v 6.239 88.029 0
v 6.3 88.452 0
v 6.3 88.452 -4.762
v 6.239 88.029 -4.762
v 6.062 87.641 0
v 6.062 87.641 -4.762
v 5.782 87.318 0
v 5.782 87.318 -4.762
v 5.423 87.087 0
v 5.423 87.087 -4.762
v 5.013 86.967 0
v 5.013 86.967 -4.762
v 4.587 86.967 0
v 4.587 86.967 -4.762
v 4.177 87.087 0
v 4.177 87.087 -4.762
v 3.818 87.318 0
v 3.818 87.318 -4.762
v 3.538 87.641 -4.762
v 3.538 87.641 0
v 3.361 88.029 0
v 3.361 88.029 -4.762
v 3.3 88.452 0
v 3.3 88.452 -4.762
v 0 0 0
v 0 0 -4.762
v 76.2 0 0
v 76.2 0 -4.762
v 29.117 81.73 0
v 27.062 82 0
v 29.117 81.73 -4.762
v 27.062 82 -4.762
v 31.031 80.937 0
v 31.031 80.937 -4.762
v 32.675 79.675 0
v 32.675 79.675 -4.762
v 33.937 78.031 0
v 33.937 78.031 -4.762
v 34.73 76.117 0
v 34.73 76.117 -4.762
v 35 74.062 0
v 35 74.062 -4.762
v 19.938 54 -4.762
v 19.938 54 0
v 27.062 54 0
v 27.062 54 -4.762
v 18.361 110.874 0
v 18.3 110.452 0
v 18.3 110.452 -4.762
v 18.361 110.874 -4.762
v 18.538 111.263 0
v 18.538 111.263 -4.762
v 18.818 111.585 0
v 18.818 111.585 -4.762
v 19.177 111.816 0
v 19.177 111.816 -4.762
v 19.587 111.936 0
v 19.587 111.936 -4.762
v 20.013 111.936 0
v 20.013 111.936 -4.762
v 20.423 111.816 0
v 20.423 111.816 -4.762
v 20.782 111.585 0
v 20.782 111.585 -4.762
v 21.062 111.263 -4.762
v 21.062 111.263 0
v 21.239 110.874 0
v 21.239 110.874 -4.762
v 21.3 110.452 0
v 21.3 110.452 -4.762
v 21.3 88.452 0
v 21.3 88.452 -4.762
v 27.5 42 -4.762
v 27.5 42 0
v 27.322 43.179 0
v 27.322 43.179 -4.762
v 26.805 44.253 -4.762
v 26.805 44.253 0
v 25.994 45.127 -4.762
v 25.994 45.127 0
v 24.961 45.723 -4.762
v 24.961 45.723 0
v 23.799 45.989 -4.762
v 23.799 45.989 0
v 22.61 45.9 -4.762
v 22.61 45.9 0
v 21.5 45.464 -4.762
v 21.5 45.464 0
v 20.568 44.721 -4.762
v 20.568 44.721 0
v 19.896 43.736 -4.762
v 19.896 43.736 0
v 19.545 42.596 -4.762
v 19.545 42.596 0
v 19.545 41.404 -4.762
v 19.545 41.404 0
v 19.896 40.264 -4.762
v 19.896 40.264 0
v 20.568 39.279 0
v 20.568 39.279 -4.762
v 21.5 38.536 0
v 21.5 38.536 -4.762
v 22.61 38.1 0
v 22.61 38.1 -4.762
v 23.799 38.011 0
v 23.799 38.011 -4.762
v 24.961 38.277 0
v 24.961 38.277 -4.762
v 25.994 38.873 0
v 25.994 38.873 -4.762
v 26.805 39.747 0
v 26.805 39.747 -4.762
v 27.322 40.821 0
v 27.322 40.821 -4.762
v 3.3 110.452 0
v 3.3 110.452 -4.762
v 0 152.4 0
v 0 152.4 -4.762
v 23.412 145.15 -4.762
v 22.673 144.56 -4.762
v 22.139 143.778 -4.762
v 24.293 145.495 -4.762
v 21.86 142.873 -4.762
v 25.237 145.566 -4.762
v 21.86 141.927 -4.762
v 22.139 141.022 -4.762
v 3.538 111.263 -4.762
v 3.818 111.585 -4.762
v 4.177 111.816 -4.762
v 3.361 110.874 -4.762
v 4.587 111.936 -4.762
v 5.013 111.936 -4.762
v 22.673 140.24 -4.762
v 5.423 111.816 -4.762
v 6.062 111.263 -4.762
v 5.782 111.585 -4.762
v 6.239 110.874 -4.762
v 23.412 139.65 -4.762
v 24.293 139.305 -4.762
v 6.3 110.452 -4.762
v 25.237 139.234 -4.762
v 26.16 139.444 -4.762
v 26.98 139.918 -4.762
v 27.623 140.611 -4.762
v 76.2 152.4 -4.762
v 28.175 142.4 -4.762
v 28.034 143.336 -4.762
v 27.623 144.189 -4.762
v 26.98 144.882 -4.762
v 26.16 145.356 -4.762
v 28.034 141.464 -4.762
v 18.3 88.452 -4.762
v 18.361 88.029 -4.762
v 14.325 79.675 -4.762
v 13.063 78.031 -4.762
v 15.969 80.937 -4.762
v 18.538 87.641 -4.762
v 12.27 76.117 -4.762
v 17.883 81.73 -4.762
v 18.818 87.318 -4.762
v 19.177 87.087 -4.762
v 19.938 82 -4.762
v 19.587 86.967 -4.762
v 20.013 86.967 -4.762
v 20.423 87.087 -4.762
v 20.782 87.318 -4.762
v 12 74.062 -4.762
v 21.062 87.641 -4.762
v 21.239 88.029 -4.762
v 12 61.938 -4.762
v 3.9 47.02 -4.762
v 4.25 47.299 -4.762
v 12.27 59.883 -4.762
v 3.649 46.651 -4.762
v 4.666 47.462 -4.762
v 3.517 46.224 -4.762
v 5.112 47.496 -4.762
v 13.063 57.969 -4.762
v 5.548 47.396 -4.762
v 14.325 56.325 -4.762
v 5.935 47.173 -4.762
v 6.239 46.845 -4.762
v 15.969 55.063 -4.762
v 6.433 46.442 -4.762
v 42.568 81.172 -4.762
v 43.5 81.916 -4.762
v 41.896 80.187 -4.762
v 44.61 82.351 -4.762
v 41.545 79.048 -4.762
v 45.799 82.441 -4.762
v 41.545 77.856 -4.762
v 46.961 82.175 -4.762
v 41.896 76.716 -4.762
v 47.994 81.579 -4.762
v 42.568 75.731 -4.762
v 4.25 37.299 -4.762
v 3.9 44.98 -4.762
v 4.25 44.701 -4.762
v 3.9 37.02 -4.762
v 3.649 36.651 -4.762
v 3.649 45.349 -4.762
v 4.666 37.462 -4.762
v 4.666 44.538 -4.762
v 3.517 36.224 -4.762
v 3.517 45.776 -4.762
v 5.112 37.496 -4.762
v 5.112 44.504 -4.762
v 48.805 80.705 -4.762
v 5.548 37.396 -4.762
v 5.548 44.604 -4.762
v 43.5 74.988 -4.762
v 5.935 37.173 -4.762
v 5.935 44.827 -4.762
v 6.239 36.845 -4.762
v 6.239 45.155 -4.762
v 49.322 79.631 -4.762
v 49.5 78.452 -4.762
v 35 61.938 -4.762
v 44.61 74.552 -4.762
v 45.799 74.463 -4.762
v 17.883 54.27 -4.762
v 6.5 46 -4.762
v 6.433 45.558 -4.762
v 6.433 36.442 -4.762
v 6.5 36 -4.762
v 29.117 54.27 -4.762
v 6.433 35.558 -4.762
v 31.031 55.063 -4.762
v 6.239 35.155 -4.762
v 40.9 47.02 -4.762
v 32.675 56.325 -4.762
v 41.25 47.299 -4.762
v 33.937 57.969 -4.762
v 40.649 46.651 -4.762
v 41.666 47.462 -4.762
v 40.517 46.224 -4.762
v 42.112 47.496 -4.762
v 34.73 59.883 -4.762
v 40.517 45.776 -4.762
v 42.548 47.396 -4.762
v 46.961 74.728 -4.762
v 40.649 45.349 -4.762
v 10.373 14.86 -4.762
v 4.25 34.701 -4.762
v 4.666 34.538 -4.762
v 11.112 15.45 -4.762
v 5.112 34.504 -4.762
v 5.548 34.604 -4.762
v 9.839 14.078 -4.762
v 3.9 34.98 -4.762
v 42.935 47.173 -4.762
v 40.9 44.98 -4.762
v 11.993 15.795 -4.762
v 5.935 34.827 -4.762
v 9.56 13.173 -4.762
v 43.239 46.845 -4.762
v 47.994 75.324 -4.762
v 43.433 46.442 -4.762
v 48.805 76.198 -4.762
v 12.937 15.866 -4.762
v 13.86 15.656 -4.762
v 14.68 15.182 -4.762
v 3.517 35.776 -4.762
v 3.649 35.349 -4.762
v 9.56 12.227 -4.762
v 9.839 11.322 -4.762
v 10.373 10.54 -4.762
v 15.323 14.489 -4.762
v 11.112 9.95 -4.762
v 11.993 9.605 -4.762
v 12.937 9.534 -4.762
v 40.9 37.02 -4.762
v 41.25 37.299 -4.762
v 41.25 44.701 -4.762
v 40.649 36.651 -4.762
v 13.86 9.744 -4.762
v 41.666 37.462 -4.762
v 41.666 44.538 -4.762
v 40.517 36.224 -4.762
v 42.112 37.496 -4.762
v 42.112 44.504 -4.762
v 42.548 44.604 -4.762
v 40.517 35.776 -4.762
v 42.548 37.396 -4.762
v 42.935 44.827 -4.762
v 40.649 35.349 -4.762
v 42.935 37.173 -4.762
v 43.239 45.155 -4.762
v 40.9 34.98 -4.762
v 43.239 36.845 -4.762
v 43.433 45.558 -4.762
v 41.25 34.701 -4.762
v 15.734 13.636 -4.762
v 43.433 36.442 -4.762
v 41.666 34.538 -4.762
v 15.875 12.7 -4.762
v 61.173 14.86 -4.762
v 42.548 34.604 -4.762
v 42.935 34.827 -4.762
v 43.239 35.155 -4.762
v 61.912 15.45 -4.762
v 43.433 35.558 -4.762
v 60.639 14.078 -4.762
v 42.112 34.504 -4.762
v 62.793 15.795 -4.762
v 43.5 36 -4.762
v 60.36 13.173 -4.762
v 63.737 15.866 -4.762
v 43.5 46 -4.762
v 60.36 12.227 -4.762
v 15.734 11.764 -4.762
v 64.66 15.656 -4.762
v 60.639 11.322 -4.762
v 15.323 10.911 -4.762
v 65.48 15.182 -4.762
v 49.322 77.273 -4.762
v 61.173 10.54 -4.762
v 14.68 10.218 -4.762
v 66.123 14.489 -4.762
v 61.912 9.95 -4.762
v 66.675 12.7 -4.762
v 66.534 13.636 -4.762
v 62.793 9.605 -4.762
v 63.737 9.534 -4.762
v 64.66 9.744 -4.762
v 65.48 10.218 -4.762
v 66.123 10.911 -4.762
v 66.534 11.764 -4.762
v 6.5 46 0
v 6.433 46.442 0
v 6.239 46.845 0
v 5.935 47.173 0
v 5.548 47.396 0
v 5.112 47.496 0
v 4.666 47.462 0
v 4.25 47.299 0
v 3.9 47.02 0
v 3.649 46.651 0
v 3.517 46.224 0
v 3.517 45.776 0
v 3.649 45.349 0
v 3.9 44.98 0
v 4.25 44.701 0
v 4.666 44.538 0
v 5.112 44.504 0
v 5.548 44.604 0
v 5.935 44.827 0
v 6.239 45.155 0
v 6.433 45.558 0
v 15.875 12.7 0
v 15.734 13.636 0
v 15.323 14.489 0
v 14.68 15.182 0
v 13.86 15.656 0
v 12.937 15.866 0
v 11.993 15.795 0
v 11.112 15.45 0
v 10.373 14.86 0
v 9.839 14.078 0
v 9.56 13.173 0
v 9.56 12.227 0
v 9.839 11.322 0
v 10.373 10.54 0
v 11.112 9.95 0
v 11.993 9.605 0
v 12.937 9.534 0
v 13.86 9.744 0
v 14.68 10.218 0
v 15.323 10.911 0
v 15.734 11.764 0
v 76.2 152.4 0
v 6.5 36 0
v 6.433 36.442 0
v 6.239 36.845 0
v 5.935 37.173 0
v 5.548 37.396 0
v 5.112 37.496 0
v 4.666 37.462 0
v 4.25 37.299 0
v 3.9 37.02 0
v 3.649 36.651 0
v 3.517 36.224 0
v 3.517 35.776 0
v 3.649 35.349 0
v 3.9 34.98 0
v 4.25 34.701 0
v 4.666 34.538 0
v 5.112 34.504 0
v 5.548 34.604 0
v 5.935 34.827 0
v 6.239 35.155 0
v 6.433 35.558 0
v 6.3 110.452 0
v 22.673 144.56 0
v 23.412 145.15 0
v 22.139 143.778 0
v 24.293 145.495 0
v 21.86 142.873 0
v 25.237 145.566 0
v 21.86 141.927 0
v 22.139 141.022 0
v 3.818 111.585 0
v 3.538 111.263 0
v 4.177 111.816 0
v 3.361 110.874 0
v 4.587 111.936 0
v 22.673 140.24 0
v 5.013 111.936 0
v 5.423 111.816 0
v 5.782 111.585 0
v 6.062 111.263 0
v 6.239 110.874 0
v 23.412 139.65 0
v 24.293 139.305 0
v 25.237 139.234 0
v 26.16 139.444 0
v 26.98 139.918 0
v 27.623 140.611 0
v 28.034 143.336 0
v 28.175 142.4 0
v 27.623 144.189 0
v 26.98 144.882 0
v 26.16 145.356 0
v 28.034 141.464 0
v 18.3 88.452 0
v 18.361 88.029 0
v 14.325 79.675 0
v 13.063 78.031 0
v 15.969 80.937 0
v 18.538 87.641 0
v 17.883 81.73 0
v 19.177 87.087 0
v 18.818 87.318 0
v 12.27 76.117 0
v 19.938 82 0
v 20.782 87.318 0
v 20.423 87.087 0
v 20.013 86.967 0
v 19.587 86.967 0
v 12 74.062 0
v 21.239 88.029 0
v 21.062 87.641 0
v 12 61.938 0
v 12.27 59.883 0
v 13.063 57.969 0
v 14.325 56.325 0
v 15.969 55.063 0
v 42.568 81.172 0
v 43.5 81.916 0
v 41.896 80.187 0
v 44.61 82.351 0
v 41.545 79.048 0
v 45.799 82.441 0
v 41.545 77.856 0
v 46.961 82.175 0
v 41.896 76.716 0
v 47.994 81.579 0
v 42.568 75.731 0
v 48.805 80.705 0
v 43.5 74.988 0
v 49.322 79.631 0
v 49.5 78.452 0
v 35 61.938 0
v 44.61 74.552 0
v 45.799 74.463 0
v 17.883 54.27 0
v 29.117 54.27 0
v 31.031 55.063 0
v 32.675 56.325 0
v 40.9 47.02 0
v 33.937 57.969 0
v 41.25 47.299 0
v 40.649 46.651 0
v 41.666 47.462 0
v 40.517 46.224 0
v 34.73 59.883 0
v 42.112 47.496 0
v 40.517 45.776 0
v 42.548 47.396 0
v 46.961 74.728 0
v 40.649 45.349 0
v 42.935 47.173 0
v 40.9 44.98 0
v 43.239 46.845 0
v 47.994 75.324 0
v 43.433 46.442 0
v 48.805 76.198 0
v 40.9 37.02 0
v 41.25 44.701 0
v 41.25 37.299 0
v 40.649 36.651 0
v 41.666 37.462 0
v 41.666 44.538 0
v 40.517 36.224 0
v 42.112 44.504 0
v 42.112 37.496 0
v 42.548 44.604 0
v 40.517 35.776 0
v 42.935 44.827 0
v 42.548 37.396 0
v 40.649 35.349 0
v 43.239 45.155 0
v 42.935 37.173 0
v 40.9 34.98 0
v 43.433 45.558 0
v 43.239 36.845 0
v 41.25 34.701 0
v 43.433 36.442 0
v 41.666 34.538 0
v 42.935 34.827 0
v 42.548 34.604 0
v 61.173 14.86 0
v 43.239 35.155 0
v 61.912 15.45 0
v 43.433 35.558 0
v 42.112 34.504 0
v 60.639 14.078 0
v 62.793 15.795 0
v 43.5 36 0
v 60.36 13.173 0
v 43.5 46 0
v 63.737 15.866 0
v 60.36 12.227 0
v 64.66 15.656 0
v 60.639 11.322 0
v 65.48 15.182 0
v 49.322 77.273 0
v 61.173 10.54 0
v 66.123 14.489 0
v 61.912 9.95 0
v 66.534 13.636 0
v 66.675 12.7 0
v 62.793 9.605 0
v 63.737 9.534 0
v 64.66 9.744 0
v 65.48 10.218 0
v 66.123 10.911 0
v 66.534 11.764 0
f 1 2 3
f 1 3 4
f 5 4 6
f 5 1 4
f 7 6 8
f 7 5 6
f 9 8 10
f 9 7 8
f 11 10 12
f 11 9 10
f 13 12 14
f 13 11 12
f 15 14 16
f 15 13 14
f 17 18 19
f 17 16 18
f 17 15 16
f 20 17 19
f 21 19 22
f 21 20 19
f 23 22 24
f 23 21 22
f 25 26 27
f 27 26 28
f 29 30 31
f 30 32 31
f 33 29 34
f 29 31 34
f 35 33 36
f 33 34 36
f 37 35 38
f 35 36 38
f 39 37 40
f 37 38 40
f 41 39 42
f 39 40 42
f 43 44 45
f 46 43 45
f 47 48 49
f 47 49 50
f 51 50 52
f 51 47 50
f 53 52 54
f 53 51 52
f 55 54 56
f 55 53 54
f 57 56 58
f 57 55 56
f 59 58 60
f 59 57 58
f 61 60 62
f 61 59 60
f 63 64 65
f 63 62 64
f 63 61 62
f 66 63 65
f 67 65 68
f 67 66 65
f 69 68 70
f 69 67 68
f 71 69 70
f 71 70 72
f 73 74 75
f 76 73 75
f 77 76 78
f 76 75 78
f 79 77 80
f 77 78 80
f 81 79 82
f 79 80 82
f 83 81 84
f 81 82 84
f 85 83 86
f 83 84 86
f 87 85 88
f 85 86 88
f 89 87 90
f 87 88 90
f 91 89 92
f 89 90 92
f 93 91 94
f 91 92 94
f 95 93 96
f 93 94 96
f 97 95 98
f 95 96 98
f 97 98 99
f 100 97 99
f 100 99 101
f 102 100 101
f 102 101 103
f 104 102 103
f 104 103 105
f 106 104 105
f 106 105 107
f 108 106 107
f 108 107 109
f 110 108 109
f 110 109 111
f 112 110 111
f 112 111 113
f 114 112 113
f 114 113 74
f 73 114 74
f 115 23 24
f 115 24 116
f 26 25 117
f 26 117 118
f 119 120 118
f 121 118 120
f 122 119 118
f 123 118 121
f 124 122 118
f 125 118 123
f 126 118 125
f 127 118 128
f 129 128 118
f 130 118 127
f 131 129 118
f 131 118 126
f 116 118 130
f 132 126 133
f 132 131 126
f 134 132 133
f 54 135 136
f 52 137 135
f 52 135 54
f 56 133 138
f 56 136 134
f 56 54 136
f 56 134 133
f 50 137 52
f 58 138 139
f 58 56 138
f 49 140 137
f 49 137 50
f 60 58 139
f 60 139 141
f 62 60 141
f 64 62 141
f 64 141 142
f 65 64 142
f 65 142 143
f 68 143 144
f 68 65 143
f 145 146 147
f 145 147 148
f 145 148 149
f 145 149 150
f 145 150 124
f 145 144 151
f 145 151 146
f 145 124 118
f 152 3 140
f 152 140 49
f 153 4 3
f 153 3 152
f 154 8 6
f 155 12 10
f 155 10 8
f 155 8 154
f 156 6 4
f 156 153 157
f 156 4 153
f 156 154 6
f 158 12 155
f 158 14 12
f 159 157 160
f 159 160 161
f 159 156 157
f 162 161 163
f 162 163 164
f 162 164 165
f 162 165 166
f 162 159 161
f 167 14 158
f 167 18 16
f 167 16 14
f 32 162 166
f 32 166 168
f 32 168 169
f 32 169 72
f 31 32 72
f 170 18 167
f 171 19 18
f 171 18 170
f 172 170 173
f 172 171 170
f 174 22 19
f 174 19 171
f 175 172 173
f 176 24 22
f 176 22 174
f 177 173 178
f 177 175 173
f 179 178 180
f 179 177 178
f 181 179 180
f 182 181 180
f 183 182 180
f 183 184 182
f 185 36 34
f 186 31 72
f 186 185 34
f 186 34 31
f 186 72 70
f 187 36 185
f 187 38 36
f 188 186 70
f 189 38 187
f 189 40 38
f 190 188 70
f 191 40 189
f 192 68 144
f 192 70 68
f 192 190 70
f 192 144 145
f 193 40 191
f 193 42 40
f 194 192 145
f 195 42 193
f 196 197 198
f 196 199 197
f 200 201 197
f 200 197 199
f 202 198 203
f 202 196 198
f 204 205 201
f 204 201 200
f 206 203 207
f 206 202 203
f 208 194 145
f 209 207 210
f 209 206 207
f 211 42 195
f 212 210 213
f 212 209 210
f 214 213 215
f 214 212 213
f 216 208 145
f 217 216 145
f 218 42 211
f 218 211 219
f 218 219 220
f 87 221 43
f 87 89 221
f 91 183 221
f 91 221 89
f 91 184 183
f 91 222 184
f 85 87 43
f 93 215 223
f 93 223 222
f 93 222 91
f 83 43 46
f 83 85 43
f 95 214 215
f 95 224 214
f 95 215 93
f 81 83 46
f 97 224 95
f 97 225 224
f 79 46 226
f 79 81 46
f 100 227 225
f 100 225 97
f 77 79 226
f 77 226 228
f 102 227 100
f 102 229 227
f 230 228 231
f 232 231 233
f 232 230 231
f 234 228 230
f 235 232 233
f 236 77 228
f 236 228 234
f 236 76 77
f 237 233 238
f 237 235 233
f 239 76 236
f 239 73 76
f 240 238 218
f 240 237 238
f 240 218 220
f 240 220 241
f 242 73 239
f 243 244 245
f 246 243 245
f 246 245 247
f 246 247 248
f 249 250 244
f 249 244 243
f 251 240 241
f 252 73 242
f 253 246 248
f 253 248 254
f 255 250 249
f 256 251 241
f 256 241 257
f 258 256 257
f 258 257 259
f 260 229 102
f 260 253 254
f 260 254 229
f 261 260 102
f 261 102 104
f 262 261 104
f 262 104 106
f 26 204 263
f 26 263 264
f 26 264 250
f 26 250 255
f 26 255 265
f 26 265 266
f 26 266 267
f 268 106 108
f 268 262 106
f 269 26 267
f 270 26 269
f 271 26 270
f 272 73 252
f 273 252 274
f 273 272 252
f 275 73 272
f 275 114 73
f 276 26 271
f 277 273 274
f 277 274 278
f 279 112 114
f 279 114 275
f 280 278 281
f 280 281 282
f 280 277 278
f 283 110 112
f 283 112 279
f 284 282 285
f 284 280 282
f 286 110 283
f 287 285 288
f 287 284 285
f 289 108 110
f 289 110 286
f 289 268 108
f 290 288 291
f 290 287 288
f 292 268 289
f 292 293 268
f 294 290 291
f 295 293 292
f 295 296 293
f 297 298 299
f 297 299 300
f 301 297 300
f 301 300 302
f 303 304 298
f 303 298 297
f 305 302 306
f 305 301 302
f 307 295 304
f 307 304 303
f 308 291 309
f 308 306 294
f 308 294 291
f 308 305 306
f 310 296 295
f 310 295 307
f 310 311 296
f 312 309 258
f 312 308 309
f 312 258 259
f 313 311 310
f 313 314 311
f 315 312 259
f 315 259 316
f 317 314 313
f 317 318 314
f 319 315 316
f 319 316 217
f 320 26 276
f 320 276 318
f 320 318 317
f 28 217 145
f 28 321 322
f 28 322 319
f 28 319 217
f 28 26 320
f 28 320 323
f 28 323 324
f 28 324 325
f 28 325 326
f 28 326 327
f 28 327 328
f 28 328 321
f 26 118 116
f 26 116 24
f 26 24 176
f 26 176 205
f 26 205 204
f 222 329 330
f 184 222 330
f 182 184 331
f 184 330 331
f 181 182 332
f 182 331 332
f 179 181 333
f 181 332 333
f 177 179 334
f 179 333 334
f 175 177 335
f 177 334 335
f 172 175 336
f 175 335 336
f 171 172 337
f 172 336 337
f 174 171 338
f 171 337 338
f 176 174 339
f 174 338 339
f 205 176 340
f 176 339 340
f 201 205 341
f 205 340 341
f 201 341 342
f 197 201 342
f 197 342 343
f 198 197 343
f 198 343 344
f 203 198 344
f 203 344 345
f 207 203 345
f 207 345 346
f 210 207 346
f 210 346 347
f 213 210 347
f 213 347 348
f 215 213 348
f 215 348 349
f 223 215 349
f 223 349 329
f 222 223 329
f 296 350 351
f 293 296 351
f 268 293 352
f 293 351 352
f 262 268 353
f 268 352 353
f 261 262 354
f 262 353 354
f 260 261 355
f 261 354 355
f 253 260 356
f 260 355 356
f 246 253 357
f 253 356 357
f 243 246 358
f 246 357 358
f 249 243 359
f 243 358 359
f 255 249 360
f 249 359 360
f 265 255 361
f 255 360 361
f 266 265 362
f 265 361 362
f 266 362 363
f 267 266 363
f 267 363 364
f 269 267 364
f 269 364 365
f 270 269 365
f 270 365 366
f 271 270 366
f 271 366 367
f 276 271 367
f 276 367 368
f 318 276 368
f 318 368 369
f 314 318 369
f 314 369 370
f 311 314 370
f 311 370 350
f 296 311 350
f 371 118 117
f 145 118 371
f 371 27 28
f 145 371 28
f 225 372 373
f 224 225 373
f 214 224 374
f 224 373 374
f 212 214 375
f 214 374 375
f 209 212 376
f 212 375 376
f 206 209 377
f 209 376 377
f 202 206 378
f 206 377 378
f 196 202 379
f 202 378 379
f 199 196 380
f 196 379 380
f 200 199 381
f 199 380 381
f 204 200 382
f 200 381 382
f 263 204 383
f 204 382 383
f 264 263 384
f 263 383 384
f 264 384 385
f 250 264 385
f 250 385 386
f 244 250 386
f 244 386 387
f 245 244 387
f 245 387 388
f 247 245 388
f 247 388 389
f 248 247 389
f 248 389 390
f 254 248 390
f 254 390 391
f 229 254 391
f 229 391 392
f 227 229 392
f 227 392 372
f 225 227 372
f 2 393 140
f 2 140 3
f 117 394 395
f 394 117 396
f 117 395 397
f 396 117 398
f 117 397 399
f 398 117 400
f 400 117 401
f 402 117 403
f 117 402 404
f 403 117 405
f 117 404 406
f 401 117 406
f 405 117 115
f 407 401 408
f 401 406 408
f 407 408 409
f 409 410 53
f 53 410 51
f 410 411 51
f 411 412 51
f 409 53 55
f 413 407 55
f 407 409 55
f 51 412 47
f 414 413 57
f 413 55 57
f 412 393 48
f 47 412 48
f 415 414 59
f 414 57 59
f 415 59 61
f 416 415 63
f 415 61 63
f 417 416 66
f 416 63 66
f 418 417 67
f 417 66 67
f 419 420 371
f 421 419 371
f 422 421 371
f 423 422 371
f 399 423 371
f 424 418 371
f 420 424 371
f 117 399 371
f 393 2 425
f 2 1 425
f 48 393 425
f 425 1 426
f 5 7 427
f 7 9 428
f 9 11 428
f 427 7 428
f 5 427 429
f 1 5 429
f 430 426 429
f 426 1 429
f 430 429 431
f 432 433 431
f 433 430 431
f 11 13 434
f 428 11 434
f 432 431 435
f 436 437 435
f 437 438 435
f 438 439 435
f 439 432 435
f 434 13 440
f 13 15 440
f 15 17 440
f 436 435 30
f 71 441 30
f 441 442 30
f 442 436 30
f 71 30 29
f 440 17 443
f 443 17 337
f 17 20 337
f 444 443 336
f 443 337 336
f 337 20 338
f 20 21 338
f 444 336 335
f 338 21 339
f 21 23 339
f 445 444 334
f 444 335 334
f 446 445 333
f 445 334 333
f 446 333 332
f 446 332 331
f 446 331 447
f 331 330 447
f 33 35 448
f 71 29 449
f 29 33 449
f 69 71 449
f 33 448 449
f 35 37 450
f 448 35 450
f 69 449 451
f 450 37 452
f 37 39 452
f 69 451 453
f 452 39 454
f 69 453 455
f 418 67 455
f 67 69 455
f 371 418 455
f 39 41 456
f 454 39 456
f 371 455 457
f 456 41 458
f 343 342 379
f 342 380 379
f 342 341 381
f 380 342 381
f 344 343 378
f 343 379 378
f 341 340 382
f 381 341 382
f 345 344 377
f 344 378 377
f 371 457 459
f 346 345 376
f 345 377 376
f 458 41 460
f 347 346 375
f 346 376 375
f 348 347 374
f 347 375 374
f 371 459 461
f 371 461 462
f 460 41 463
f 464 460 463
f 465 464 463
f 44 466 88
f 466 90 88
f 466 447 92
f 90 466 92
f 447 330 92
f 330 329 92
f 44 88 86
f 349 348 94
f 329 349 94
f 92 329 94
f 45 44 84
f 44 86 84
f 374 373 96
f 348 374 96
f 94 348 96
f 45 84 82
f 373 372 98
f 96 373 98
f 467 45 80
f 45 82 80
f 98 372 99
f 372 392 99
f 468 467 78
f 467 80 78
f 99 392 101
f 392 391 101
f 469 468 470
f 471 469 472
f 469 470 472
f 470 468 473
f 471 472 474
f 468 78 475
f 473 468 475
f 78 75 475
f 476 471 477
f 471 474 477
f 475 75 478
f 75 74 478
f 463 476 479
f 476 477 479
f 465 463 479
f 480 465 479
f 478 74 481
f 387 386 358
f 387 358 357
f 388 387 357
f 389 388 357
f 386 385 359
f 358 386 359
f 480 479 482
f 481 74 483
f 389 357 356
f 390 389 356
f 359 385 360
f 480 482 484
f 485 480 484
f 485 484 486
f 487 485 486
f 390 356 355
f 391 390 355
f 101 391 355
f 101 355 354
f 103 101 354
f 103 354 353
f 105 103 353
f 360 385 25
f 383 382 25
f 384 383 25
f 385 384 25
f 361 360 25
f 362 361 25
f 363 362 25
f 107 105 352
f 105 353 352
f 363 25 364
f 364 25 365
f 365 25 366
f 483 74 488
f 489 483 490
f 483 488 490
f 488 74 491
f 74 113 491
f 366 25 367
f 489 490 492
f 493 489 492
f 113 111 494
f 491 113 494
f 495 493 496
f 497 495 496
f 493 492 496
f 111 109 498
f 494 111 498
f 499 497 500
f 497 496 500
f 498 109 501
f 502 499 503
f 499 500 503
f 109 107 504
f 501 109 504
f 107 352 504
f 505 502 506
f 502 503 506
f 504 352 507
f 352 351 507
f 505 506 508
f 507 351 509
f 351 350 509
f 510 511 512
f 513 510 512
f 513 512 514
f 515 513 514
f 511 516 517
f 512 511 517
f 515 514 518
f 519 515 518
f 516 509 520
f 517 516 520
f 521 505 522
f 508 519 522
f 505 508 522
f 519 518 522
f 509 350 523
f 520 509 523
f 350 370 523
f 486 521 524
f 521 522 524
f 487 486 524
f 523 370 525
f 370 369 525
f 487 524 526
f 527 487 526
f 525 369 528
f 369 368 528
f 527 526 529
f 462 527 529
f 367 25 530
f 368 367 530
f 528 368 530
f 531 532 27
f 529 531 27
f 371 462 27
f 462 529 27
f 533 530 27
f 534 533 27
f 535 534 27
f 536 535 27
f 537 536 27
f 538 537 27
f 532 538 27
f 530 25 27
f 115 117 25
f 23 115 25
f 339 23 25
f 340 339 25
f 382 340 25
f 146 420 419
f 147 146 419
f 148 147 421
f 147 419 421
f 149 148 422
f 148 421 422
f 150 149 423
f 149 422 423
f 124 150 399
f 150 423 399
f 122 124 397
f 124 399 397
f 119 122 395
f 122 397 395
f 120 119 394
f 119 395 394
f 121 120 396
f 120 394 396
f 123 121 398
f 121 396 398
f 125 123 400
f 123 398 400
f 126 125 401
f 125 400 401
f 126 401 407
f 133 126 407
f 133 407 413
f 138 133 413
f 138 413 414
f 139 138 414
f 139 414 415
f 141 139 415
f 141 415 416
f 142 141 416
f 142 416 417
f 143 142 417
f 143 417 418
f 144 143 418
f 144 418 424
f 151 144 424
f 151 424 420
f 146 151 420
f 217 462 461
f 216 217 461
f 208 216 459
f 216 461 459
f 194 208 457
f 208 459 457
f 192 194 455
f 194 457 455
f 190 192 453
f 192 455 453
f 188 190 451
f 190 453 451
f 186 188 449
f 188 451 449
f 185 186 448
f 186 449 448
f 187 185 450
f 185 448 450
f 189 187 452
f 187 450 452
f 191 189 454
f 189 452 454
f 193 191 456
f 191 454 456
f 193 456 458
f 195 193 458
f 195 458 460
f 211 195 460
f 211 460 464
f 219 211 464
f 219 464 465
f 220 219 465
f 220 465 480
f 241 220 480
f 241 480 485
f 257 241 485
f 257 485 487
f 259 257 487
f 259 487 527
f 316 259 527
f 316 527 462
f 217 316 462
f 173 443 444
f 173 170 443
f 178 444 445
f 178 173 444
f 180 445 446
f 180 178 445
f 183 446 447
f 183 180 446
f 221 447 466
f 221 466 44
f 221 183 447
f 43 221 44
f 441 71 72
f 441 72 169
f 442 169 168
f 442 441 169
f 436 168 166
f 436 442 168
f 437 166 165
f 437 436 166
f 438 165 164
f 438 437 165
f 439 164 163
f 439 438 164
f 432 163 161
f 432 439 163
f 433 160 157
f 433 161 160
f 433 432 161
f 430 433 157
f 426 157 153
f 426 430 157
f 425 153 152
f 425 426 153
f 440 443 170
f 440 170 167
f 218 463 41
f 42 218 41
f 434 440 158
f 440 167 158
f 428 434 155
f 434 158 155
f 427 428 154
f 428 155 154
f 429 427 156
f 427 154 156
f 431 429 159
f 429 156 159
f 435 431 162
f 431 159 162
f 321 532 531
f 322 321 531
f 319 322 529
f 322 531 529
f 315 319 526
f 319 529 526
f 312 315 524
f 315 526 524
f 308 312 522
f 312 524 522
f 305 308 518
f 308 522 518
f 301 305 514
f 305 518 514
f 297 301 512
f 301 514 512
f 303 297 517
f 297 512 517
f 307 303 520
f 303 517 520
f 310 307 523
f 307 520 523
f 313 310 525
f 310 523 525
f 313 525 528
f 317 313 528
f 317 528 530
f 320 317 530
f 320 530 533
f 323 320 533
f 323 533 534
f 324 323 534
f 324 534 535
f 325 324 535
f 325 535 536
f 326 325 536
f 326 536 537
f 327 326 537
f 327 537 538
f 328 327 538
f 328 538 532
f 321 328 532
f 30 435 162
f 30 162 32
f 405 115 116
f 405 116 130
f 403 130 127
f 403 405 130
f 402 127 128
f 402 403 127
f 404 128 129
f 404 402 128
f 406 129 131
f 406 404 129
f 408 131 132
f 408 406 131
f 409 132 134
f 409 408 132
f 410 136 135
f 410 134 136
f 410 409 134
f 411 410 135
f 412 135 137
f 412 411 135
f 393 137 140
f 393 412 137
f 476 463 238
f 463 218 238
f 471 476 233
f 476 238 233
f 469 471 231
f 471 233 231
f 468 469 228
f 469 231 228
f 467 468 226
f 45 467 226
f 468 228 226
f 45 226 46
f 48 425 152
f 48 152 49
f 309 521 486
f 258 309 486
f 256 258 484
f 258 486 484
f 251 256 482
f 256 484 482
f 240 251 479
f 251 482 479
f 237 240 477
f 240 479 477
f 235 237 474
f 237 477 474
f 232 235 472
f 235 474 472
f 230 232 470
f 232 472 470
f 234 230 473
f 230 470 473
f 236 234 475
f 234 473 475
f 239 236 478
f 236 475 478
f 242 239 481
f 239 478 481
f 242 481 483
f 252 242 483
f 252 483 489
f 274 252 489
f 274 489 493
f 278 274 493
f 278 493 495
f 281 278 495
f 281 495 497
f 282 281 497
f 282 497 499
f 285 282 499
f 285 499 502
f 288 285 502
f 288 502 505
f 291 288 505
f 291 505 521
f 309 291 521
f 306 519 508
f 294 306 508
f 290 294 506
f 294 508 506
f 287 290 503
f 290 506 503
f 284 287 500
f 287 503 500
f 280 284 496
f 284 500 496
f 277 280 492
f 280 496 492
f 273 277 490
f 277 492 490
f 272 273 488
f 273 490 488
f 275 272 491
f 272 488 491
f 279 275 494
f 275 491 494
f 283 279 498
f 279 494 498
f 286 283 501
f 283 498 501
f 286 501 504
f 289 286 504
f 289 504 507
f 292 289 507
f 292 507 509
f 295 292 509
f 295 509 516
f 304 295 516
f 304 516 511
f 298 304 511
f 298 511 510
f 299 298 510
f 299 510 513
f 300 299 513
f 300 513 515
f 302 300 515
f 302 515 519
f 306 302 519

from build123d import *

# Parameters (mm, degrees)
SKETCH1_W           = 76.2
SKETCH1_H           = 4.7625
BOSS_EXTRUDE1_DEPTH = 152.4
SKETCH2_R           = 4
CUT_EXTRUDE1_DEPTH  = 171.454924852
SKETCH3_W           = 23
SKETCH3_H           = 28
CUT_EXTRUDE2_DEPTH  = 171.454924852
FILLET1_R           = 7.9375
CUT_EXTRUDE3_DEPTH  = 171.454924852
SKETCH5_R           = 1.5
CUT_EXTRUDE4_DEPTH  = 171.454924852
SKETCH6_R           = 3.175
CUT_EXTRUDE5_DEPTH  = 171.454924852
SKETCH7_R           = 3.175
CUT_EXTRUDE6_DEPTH  = 171.454924852


with BuildPart() as part:
    # Sketch1 → Boss-Extrude1 (new body)
    with BuildSketch(Plane(origin=(0, 0, 0), x_dir=(1, 0, 0), z_dir=(0, 1, 0))):
        with Locations((38.1, 2.38125)):
            Rectangle(SKETCH1_W, SKETCH1_H)
    extrude(amount=BOSS_EXTRUDE1_DEPTH)

    # Sketch2 → Cut-Extrude1 (cut, through all)
    with BuildSketch(Plane.XY):
        with Locations((23.5, 42)):
            Circle(SKETCH2_R)
        with Locations((45.5, 78.451705922)):
            Circle(SKETCH2_R)
    extrude(amount=-CUT_EXTRUDE1_DEPTH, mode=Mode.SUBTRACT)

    # Sketch3 → Cut-Extrude2 (cut, through all)
    with BuildSketch(Plane.XY):
        with Locations((23.5, 68)):
            Rectangle(SKETCH3_W, SKETCH3_H)
    extrude(amount=-CUT_EXTRUDE2_DEPTH, mode=Mode.SUBTRACT)

    # Fillet1
    fillet1_edges = [part.edges().sort_by_distance(p)[0] for p in [
        (12, 54, -2.38125),
        (12, 82, -2.38125),
        (35, 82, -2.38125),
        (35, 54, -2.38125),
    ]]
    fillet(fillet1_edges, radius=FILLET1_R)

    # Sketch4 → Cut-Extrude3 (cut, through all)
    with BuildSketch(Plane.XY):
        with BuildLine():
            Line((6.3, 110.451705922), (6.3, 88.451705922))
            ThreePointArc((6.3, 88.451705922), (4.8, 86.951705922), (3.3, 88.451705922))
            Line((3.3, 88.451705922), (3.3, 110.451705922))
            ThreePointArc((3.3, 110.451705922), (4.8, 111.951705922), (6.3, 110.451705922))
        make_face()
        with BuildLine():
            Line((21.3, 110.451705922), (21.3, 88.451705922))
            ThreePointArc((21.3, 88.451705922), (19.8, 86.951705922), (18.3, 88.451705922))
            Line((18.3, 88.451705922), (18.3, 110.451705922))
            ThreePointArc((18.3, 110.451705922), (19.8, 111.951705922), (21.3, 110.451705922))
        make_face()
    extrude(amount=-CUT_EXTRUDE3_DEPTH, mode=Mode.SUBTRACT)

    # Sketch5 → Cut-Extrude4 (cut, through all)
    with BuildSketch(Plane.XY):
        with Locations((5, 36)):
            Circle(SKETCH5_R)
        with Locations((42, 36)):
            Circle(SKETCH5_R)
        with Locations((5, 46)):
            Circle(SKETCH5_R)
        with Locations((42, 46)):
            Circle(SKETCH5_R)
    extrude(amount=-CUT_EXTRUDE4_DEPTH, mode=Mode.SUBTRACT)

    # Sketch6 → Cut-Extrude5 (cut, through all)
    with BuildSketch(Plane.XY):
        with Locations((12.7, 12.7)):
            Circle(SKETCH6_R)
        with Locations((63.5, 12.7)):
            Circle(SKETCH6_R)
    extrude(amount=-CUT_EXTRUDE5_DEPTH, mode=Mode.SUBTRACT)

    # Sketch7 → Cut-Extrude6 (cut, through all)
    with BuildSketch(Plane.XY):
        with Locations((25, 142.4)):
            Circle(SKETCH7_R)
    extrude(amount=-CUT_EXTRUDE6_DEPTH, mode=Mode.SUBTRACT)


solid = part.part
